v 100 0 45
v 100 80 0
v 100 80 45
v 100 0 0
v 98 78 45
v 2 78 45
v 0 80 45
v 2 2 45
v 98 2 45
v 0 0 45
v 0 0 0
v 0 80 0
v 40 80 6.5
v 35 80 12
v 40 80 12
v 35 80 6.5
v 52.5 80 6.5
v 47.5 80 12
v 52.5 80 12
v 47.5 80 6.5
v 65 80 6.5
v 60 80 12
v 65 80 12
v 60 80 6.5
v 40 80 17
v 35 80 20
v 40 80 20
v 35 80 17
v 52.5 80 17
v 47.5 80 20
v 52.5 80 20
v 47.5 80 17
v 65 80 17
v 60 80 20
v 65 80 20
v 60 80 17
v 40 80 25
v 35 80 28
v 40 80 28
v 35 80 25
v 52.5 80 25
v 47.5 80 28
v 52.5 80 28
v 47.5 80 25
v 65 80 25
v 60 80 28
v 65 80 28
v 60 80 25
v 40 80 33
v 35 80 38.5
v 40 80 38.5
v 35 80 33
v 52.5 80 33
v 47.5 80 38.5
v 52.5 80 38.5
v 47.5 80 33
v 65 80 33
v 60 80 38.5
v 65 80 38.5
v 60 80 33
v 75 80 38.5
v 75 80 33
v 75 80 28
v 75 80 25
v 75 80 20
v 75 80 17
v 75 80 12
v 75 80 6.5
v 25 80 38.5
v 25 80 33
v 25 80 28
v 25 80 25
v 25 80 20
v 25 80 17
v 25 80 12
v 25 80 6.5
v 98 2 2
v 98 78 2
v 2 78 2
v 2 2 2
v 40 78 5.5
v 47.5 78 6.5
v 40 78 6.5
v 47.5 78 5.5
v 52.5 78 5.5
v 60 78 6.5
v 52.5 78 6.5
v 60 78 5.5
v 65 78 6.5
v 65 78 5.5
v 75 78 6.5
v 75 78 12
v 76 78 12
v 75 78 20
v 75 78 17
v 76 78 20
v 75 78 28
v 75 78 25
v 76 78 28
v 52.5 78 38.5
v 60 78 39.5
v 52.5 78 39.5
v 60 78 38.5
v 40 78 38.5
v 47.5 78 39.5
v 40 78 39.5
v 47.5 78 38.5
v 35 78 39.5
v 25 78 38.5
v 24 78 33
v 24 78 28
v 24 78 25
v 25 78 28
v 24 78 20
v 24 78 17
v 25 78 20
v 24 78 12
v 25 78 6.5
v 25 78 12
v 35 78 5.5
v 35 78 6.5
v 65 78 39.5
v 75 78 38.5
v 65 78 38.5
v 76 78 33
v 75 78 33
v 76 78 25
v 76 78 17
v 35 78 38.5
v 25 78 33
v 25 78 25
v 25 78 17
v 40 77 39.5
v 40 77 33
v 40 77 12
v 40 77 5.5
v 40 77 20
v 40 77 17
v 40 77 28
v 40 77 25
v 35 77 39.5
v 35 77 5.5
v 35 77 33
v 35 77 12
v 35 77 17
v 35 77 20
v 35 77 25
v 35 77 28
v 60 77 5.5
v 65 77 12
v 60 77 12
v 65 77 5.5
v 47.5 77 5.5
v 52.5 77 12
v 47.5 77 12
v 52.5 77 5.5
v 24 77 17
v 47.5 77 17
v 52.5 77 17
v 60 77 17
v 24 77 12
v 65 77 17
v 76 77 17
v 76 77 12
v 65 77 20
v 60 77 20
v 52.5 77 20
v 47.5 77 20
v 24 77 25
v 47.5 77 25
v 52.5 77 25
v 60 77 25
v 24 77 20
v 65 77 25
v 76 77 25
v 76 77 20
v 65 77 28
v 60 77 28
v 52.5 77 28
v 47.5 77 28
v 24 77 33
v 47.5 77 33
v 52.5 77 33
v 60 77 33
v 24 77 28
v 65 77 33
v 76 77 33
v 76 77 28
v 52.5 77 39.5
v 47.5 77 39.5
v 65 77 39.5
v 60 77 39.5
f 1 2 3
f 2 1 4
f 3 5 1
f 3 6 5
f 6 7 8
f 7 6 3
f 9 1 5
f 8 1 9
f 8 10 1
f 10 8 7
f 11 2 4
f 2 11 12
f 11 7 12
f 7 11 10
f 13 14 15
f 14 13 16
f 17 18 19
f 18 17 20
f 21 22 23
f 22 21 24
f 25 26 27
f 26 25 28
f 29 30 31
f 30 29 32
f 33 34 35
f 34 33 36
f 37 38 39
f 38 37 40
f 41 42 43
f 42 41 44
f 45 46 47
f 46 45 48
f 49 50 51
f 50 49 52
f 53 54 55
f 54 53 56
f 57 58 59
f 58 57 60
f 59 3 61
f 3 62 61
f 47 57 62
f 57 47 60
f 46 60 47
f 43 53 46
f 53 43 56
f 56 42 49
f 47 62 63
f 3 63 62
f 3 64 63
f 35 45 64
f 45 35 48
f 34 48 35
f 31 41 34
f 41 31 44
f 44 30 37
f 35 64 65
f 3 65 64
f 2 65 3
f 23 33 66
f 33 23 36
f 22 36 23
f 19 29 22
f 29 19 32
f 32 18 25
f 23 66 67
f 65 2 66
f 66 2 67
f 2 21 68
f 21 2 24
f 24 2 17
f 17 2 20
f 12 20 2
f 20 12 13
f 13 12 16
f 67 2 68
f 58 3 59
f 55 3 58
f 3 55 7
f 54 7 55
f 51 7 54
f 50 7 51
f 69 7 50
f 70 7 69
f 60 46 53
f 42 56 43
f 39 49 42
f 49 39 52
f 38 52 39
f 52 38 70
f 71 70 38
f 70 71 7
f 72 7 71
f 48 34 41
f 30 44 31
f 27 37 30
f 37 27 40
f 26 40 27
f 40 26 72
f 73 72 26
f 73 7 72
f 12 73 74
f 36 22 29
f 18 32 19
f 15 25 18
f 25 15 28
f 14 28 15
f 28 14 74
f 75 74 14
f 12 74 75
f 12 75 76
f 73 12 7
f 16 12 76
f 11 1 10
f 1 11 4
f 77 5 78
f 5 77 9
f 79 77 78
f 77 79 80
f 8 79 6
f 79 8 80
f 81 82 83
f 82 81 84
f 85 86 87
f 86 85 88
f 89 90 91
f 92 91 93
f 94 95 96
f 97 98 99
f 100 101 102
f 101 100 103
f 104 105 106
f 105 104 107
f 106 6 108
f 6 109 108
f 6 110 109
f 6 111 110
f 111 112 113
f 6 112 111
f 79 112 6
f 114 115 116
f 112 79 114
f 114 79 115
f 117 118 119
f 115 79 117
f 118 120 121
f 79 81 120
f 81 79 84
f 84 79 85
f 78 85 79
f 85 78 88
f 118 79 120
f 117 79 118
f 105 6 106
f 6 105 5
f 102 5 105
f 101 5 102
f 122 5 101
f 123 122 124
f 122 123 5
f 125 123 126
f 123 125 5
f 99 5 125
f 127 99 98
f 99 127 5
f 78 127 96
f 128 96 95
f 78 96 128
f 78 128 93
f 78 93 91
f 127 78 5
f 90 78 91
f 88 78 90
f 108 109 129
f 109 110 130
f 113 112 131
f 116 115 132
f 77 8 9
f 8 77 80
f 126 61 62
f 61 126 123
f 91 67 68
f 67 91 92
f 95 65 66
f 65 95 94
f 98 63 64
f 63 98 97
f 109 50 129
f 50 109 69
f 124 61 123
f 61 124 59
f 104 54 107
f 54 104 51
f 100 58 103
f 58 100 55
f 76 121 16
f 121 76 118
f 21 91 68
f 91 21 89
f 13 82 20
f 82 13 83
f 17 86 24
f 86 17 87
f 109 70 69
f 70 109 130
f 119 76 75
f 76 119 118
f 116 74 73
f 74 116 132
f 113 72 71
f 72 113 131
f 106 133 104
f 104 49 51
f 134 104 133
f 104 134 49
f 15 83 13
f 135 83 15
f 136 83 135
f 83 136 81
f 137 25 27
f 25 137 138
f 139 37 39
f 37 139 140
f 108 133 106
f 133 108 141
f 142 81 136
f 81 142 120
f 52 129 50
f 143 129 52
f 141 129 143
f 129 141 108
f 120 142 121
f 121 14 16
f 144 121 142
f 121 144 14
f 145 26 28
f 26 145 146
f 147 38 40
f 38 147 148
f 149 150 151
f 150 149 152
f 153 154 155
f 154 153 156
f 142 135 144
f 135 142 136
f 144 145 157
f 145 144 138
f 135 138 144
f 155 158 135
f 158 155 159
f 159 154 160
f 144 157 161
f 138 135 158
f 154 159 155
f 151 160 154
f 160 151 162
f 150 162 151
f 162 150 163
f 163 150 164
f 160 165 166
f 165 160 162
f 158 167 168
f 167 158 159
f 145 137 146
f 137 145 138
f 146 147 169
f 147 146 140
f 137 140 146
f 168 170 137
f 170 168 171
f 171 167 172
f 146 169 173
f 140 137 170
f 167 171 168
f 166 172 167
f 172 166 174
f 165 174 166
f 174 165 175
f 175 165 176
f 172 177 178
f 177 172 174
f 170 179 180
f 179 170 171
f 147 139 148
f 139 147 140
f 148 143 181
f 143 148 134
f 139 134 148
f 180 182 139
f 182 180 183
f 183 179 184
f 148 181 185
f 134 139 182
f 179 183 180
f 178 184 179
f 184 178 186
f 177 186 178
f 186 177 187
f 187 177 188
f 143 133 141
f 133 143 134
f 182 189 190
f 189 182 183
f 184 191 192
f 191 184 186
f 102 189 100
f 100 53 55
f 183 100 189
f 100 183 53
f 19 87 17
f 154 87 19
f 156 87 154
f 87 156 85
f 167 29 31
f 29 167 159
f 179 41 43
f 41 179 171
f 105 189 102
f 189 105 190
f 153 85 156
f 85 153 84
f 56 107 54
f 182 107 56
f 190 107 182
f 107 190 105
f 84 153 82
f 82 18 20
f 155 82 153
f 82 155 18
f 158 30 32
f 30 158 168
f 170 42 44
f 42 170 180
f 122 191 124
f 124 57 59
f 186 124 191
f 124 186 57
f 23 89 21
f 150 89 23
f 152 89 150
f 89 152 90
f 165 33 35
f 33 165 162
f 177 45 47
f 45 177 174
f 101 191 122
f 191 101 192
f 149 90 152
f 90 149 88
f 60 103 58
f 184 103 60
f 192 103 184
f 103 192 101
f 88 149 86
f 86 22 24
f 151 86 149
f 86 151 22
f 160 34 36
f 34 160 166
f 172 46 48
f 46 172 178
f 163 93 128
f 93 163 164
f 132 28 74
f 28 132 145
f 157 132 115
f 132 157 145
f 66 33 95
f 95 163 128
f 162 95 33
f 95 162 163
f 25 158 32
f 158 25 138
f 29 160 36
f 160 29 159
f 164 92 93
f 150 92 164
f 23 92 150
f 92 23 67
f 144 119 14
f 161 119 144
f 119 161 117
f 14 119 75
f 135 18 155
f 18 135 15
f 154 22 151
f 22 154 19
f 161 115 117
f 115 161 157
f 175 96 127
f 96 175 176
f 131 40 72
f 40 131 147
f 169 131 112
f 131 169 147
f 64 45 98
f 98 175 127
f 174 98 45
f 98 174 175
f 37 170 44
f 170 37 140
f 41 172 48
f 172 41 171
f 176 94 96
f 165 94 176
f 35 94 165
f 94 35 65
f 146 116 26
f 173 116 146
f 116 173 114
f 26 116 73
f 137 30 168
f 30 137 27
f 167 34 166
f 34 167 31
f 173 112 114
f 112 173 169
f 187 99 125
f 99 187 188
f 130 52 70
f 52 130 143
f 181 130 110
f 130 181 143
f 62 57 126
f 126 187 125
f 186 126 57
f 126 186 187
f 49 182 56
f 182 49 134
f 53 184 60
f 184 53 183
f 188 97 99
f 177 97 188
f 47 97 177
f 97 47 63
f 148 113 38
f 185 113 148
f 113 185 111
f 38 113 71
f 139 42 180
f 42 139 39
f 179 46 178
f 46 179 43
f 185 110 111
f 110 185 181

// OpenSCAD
$fn = 32;

// ----------------------------------------------------------------------
// Vent box: crossgrid enclosure
// ----------------------------------------------------------------------

// --- parameters (mm) ---
box_l = 100;              // box length, X
box_w = 80;               // box width, Y
box_h = 45;               // box height, Z
wall_t = 2;               // shell wall thickness
win_l = 50;               // vent window width, X
win_h = 32;               // vent window height, Z
bar_w = 5;                // grid bar width
n_v = 3;                  // vertical bar count
n_h = 3;                  // horizontal bar count

win_z0 = (box_h - win_h) / 2;  // window lower edge Z
v_step = win_l / (n_v + 1);  // vertical bar step
h_step = win_h / (n_h + 1);  // horizontal bar step

difference() {
  union() {
    difference() {
      cube([box_l, box_w, box_h]);
  translate([wall_t, wall_t, wall_t])
    cube([box_l - 2 * wall_t, box_w - 2 * wall_t, box_h]);
  translate([(box_l - win_l) / 2, box_w - wall_t - 1, win_z0])
    cube([win_l, wall_t + 2, win_h]);
    }
    for (i = [1 : n_v])
      translate([(box_l - win_l) / 2 + i * v_step - bar_w / 2,
                 box_w - wall_t - 1, win_z0 - 1])
        cube([bar_w, wall_t + 1, win_h + 2]);
    for (i = [1 : n_h])
      translate([(box_l - win_l) / 2 - 1, box_w - wall_t - 1,
                 win_z0 + i * h_step - bar_w / 2])
        cube([win_l + 2, wall_t + 1, bar_w]);
  }
}
